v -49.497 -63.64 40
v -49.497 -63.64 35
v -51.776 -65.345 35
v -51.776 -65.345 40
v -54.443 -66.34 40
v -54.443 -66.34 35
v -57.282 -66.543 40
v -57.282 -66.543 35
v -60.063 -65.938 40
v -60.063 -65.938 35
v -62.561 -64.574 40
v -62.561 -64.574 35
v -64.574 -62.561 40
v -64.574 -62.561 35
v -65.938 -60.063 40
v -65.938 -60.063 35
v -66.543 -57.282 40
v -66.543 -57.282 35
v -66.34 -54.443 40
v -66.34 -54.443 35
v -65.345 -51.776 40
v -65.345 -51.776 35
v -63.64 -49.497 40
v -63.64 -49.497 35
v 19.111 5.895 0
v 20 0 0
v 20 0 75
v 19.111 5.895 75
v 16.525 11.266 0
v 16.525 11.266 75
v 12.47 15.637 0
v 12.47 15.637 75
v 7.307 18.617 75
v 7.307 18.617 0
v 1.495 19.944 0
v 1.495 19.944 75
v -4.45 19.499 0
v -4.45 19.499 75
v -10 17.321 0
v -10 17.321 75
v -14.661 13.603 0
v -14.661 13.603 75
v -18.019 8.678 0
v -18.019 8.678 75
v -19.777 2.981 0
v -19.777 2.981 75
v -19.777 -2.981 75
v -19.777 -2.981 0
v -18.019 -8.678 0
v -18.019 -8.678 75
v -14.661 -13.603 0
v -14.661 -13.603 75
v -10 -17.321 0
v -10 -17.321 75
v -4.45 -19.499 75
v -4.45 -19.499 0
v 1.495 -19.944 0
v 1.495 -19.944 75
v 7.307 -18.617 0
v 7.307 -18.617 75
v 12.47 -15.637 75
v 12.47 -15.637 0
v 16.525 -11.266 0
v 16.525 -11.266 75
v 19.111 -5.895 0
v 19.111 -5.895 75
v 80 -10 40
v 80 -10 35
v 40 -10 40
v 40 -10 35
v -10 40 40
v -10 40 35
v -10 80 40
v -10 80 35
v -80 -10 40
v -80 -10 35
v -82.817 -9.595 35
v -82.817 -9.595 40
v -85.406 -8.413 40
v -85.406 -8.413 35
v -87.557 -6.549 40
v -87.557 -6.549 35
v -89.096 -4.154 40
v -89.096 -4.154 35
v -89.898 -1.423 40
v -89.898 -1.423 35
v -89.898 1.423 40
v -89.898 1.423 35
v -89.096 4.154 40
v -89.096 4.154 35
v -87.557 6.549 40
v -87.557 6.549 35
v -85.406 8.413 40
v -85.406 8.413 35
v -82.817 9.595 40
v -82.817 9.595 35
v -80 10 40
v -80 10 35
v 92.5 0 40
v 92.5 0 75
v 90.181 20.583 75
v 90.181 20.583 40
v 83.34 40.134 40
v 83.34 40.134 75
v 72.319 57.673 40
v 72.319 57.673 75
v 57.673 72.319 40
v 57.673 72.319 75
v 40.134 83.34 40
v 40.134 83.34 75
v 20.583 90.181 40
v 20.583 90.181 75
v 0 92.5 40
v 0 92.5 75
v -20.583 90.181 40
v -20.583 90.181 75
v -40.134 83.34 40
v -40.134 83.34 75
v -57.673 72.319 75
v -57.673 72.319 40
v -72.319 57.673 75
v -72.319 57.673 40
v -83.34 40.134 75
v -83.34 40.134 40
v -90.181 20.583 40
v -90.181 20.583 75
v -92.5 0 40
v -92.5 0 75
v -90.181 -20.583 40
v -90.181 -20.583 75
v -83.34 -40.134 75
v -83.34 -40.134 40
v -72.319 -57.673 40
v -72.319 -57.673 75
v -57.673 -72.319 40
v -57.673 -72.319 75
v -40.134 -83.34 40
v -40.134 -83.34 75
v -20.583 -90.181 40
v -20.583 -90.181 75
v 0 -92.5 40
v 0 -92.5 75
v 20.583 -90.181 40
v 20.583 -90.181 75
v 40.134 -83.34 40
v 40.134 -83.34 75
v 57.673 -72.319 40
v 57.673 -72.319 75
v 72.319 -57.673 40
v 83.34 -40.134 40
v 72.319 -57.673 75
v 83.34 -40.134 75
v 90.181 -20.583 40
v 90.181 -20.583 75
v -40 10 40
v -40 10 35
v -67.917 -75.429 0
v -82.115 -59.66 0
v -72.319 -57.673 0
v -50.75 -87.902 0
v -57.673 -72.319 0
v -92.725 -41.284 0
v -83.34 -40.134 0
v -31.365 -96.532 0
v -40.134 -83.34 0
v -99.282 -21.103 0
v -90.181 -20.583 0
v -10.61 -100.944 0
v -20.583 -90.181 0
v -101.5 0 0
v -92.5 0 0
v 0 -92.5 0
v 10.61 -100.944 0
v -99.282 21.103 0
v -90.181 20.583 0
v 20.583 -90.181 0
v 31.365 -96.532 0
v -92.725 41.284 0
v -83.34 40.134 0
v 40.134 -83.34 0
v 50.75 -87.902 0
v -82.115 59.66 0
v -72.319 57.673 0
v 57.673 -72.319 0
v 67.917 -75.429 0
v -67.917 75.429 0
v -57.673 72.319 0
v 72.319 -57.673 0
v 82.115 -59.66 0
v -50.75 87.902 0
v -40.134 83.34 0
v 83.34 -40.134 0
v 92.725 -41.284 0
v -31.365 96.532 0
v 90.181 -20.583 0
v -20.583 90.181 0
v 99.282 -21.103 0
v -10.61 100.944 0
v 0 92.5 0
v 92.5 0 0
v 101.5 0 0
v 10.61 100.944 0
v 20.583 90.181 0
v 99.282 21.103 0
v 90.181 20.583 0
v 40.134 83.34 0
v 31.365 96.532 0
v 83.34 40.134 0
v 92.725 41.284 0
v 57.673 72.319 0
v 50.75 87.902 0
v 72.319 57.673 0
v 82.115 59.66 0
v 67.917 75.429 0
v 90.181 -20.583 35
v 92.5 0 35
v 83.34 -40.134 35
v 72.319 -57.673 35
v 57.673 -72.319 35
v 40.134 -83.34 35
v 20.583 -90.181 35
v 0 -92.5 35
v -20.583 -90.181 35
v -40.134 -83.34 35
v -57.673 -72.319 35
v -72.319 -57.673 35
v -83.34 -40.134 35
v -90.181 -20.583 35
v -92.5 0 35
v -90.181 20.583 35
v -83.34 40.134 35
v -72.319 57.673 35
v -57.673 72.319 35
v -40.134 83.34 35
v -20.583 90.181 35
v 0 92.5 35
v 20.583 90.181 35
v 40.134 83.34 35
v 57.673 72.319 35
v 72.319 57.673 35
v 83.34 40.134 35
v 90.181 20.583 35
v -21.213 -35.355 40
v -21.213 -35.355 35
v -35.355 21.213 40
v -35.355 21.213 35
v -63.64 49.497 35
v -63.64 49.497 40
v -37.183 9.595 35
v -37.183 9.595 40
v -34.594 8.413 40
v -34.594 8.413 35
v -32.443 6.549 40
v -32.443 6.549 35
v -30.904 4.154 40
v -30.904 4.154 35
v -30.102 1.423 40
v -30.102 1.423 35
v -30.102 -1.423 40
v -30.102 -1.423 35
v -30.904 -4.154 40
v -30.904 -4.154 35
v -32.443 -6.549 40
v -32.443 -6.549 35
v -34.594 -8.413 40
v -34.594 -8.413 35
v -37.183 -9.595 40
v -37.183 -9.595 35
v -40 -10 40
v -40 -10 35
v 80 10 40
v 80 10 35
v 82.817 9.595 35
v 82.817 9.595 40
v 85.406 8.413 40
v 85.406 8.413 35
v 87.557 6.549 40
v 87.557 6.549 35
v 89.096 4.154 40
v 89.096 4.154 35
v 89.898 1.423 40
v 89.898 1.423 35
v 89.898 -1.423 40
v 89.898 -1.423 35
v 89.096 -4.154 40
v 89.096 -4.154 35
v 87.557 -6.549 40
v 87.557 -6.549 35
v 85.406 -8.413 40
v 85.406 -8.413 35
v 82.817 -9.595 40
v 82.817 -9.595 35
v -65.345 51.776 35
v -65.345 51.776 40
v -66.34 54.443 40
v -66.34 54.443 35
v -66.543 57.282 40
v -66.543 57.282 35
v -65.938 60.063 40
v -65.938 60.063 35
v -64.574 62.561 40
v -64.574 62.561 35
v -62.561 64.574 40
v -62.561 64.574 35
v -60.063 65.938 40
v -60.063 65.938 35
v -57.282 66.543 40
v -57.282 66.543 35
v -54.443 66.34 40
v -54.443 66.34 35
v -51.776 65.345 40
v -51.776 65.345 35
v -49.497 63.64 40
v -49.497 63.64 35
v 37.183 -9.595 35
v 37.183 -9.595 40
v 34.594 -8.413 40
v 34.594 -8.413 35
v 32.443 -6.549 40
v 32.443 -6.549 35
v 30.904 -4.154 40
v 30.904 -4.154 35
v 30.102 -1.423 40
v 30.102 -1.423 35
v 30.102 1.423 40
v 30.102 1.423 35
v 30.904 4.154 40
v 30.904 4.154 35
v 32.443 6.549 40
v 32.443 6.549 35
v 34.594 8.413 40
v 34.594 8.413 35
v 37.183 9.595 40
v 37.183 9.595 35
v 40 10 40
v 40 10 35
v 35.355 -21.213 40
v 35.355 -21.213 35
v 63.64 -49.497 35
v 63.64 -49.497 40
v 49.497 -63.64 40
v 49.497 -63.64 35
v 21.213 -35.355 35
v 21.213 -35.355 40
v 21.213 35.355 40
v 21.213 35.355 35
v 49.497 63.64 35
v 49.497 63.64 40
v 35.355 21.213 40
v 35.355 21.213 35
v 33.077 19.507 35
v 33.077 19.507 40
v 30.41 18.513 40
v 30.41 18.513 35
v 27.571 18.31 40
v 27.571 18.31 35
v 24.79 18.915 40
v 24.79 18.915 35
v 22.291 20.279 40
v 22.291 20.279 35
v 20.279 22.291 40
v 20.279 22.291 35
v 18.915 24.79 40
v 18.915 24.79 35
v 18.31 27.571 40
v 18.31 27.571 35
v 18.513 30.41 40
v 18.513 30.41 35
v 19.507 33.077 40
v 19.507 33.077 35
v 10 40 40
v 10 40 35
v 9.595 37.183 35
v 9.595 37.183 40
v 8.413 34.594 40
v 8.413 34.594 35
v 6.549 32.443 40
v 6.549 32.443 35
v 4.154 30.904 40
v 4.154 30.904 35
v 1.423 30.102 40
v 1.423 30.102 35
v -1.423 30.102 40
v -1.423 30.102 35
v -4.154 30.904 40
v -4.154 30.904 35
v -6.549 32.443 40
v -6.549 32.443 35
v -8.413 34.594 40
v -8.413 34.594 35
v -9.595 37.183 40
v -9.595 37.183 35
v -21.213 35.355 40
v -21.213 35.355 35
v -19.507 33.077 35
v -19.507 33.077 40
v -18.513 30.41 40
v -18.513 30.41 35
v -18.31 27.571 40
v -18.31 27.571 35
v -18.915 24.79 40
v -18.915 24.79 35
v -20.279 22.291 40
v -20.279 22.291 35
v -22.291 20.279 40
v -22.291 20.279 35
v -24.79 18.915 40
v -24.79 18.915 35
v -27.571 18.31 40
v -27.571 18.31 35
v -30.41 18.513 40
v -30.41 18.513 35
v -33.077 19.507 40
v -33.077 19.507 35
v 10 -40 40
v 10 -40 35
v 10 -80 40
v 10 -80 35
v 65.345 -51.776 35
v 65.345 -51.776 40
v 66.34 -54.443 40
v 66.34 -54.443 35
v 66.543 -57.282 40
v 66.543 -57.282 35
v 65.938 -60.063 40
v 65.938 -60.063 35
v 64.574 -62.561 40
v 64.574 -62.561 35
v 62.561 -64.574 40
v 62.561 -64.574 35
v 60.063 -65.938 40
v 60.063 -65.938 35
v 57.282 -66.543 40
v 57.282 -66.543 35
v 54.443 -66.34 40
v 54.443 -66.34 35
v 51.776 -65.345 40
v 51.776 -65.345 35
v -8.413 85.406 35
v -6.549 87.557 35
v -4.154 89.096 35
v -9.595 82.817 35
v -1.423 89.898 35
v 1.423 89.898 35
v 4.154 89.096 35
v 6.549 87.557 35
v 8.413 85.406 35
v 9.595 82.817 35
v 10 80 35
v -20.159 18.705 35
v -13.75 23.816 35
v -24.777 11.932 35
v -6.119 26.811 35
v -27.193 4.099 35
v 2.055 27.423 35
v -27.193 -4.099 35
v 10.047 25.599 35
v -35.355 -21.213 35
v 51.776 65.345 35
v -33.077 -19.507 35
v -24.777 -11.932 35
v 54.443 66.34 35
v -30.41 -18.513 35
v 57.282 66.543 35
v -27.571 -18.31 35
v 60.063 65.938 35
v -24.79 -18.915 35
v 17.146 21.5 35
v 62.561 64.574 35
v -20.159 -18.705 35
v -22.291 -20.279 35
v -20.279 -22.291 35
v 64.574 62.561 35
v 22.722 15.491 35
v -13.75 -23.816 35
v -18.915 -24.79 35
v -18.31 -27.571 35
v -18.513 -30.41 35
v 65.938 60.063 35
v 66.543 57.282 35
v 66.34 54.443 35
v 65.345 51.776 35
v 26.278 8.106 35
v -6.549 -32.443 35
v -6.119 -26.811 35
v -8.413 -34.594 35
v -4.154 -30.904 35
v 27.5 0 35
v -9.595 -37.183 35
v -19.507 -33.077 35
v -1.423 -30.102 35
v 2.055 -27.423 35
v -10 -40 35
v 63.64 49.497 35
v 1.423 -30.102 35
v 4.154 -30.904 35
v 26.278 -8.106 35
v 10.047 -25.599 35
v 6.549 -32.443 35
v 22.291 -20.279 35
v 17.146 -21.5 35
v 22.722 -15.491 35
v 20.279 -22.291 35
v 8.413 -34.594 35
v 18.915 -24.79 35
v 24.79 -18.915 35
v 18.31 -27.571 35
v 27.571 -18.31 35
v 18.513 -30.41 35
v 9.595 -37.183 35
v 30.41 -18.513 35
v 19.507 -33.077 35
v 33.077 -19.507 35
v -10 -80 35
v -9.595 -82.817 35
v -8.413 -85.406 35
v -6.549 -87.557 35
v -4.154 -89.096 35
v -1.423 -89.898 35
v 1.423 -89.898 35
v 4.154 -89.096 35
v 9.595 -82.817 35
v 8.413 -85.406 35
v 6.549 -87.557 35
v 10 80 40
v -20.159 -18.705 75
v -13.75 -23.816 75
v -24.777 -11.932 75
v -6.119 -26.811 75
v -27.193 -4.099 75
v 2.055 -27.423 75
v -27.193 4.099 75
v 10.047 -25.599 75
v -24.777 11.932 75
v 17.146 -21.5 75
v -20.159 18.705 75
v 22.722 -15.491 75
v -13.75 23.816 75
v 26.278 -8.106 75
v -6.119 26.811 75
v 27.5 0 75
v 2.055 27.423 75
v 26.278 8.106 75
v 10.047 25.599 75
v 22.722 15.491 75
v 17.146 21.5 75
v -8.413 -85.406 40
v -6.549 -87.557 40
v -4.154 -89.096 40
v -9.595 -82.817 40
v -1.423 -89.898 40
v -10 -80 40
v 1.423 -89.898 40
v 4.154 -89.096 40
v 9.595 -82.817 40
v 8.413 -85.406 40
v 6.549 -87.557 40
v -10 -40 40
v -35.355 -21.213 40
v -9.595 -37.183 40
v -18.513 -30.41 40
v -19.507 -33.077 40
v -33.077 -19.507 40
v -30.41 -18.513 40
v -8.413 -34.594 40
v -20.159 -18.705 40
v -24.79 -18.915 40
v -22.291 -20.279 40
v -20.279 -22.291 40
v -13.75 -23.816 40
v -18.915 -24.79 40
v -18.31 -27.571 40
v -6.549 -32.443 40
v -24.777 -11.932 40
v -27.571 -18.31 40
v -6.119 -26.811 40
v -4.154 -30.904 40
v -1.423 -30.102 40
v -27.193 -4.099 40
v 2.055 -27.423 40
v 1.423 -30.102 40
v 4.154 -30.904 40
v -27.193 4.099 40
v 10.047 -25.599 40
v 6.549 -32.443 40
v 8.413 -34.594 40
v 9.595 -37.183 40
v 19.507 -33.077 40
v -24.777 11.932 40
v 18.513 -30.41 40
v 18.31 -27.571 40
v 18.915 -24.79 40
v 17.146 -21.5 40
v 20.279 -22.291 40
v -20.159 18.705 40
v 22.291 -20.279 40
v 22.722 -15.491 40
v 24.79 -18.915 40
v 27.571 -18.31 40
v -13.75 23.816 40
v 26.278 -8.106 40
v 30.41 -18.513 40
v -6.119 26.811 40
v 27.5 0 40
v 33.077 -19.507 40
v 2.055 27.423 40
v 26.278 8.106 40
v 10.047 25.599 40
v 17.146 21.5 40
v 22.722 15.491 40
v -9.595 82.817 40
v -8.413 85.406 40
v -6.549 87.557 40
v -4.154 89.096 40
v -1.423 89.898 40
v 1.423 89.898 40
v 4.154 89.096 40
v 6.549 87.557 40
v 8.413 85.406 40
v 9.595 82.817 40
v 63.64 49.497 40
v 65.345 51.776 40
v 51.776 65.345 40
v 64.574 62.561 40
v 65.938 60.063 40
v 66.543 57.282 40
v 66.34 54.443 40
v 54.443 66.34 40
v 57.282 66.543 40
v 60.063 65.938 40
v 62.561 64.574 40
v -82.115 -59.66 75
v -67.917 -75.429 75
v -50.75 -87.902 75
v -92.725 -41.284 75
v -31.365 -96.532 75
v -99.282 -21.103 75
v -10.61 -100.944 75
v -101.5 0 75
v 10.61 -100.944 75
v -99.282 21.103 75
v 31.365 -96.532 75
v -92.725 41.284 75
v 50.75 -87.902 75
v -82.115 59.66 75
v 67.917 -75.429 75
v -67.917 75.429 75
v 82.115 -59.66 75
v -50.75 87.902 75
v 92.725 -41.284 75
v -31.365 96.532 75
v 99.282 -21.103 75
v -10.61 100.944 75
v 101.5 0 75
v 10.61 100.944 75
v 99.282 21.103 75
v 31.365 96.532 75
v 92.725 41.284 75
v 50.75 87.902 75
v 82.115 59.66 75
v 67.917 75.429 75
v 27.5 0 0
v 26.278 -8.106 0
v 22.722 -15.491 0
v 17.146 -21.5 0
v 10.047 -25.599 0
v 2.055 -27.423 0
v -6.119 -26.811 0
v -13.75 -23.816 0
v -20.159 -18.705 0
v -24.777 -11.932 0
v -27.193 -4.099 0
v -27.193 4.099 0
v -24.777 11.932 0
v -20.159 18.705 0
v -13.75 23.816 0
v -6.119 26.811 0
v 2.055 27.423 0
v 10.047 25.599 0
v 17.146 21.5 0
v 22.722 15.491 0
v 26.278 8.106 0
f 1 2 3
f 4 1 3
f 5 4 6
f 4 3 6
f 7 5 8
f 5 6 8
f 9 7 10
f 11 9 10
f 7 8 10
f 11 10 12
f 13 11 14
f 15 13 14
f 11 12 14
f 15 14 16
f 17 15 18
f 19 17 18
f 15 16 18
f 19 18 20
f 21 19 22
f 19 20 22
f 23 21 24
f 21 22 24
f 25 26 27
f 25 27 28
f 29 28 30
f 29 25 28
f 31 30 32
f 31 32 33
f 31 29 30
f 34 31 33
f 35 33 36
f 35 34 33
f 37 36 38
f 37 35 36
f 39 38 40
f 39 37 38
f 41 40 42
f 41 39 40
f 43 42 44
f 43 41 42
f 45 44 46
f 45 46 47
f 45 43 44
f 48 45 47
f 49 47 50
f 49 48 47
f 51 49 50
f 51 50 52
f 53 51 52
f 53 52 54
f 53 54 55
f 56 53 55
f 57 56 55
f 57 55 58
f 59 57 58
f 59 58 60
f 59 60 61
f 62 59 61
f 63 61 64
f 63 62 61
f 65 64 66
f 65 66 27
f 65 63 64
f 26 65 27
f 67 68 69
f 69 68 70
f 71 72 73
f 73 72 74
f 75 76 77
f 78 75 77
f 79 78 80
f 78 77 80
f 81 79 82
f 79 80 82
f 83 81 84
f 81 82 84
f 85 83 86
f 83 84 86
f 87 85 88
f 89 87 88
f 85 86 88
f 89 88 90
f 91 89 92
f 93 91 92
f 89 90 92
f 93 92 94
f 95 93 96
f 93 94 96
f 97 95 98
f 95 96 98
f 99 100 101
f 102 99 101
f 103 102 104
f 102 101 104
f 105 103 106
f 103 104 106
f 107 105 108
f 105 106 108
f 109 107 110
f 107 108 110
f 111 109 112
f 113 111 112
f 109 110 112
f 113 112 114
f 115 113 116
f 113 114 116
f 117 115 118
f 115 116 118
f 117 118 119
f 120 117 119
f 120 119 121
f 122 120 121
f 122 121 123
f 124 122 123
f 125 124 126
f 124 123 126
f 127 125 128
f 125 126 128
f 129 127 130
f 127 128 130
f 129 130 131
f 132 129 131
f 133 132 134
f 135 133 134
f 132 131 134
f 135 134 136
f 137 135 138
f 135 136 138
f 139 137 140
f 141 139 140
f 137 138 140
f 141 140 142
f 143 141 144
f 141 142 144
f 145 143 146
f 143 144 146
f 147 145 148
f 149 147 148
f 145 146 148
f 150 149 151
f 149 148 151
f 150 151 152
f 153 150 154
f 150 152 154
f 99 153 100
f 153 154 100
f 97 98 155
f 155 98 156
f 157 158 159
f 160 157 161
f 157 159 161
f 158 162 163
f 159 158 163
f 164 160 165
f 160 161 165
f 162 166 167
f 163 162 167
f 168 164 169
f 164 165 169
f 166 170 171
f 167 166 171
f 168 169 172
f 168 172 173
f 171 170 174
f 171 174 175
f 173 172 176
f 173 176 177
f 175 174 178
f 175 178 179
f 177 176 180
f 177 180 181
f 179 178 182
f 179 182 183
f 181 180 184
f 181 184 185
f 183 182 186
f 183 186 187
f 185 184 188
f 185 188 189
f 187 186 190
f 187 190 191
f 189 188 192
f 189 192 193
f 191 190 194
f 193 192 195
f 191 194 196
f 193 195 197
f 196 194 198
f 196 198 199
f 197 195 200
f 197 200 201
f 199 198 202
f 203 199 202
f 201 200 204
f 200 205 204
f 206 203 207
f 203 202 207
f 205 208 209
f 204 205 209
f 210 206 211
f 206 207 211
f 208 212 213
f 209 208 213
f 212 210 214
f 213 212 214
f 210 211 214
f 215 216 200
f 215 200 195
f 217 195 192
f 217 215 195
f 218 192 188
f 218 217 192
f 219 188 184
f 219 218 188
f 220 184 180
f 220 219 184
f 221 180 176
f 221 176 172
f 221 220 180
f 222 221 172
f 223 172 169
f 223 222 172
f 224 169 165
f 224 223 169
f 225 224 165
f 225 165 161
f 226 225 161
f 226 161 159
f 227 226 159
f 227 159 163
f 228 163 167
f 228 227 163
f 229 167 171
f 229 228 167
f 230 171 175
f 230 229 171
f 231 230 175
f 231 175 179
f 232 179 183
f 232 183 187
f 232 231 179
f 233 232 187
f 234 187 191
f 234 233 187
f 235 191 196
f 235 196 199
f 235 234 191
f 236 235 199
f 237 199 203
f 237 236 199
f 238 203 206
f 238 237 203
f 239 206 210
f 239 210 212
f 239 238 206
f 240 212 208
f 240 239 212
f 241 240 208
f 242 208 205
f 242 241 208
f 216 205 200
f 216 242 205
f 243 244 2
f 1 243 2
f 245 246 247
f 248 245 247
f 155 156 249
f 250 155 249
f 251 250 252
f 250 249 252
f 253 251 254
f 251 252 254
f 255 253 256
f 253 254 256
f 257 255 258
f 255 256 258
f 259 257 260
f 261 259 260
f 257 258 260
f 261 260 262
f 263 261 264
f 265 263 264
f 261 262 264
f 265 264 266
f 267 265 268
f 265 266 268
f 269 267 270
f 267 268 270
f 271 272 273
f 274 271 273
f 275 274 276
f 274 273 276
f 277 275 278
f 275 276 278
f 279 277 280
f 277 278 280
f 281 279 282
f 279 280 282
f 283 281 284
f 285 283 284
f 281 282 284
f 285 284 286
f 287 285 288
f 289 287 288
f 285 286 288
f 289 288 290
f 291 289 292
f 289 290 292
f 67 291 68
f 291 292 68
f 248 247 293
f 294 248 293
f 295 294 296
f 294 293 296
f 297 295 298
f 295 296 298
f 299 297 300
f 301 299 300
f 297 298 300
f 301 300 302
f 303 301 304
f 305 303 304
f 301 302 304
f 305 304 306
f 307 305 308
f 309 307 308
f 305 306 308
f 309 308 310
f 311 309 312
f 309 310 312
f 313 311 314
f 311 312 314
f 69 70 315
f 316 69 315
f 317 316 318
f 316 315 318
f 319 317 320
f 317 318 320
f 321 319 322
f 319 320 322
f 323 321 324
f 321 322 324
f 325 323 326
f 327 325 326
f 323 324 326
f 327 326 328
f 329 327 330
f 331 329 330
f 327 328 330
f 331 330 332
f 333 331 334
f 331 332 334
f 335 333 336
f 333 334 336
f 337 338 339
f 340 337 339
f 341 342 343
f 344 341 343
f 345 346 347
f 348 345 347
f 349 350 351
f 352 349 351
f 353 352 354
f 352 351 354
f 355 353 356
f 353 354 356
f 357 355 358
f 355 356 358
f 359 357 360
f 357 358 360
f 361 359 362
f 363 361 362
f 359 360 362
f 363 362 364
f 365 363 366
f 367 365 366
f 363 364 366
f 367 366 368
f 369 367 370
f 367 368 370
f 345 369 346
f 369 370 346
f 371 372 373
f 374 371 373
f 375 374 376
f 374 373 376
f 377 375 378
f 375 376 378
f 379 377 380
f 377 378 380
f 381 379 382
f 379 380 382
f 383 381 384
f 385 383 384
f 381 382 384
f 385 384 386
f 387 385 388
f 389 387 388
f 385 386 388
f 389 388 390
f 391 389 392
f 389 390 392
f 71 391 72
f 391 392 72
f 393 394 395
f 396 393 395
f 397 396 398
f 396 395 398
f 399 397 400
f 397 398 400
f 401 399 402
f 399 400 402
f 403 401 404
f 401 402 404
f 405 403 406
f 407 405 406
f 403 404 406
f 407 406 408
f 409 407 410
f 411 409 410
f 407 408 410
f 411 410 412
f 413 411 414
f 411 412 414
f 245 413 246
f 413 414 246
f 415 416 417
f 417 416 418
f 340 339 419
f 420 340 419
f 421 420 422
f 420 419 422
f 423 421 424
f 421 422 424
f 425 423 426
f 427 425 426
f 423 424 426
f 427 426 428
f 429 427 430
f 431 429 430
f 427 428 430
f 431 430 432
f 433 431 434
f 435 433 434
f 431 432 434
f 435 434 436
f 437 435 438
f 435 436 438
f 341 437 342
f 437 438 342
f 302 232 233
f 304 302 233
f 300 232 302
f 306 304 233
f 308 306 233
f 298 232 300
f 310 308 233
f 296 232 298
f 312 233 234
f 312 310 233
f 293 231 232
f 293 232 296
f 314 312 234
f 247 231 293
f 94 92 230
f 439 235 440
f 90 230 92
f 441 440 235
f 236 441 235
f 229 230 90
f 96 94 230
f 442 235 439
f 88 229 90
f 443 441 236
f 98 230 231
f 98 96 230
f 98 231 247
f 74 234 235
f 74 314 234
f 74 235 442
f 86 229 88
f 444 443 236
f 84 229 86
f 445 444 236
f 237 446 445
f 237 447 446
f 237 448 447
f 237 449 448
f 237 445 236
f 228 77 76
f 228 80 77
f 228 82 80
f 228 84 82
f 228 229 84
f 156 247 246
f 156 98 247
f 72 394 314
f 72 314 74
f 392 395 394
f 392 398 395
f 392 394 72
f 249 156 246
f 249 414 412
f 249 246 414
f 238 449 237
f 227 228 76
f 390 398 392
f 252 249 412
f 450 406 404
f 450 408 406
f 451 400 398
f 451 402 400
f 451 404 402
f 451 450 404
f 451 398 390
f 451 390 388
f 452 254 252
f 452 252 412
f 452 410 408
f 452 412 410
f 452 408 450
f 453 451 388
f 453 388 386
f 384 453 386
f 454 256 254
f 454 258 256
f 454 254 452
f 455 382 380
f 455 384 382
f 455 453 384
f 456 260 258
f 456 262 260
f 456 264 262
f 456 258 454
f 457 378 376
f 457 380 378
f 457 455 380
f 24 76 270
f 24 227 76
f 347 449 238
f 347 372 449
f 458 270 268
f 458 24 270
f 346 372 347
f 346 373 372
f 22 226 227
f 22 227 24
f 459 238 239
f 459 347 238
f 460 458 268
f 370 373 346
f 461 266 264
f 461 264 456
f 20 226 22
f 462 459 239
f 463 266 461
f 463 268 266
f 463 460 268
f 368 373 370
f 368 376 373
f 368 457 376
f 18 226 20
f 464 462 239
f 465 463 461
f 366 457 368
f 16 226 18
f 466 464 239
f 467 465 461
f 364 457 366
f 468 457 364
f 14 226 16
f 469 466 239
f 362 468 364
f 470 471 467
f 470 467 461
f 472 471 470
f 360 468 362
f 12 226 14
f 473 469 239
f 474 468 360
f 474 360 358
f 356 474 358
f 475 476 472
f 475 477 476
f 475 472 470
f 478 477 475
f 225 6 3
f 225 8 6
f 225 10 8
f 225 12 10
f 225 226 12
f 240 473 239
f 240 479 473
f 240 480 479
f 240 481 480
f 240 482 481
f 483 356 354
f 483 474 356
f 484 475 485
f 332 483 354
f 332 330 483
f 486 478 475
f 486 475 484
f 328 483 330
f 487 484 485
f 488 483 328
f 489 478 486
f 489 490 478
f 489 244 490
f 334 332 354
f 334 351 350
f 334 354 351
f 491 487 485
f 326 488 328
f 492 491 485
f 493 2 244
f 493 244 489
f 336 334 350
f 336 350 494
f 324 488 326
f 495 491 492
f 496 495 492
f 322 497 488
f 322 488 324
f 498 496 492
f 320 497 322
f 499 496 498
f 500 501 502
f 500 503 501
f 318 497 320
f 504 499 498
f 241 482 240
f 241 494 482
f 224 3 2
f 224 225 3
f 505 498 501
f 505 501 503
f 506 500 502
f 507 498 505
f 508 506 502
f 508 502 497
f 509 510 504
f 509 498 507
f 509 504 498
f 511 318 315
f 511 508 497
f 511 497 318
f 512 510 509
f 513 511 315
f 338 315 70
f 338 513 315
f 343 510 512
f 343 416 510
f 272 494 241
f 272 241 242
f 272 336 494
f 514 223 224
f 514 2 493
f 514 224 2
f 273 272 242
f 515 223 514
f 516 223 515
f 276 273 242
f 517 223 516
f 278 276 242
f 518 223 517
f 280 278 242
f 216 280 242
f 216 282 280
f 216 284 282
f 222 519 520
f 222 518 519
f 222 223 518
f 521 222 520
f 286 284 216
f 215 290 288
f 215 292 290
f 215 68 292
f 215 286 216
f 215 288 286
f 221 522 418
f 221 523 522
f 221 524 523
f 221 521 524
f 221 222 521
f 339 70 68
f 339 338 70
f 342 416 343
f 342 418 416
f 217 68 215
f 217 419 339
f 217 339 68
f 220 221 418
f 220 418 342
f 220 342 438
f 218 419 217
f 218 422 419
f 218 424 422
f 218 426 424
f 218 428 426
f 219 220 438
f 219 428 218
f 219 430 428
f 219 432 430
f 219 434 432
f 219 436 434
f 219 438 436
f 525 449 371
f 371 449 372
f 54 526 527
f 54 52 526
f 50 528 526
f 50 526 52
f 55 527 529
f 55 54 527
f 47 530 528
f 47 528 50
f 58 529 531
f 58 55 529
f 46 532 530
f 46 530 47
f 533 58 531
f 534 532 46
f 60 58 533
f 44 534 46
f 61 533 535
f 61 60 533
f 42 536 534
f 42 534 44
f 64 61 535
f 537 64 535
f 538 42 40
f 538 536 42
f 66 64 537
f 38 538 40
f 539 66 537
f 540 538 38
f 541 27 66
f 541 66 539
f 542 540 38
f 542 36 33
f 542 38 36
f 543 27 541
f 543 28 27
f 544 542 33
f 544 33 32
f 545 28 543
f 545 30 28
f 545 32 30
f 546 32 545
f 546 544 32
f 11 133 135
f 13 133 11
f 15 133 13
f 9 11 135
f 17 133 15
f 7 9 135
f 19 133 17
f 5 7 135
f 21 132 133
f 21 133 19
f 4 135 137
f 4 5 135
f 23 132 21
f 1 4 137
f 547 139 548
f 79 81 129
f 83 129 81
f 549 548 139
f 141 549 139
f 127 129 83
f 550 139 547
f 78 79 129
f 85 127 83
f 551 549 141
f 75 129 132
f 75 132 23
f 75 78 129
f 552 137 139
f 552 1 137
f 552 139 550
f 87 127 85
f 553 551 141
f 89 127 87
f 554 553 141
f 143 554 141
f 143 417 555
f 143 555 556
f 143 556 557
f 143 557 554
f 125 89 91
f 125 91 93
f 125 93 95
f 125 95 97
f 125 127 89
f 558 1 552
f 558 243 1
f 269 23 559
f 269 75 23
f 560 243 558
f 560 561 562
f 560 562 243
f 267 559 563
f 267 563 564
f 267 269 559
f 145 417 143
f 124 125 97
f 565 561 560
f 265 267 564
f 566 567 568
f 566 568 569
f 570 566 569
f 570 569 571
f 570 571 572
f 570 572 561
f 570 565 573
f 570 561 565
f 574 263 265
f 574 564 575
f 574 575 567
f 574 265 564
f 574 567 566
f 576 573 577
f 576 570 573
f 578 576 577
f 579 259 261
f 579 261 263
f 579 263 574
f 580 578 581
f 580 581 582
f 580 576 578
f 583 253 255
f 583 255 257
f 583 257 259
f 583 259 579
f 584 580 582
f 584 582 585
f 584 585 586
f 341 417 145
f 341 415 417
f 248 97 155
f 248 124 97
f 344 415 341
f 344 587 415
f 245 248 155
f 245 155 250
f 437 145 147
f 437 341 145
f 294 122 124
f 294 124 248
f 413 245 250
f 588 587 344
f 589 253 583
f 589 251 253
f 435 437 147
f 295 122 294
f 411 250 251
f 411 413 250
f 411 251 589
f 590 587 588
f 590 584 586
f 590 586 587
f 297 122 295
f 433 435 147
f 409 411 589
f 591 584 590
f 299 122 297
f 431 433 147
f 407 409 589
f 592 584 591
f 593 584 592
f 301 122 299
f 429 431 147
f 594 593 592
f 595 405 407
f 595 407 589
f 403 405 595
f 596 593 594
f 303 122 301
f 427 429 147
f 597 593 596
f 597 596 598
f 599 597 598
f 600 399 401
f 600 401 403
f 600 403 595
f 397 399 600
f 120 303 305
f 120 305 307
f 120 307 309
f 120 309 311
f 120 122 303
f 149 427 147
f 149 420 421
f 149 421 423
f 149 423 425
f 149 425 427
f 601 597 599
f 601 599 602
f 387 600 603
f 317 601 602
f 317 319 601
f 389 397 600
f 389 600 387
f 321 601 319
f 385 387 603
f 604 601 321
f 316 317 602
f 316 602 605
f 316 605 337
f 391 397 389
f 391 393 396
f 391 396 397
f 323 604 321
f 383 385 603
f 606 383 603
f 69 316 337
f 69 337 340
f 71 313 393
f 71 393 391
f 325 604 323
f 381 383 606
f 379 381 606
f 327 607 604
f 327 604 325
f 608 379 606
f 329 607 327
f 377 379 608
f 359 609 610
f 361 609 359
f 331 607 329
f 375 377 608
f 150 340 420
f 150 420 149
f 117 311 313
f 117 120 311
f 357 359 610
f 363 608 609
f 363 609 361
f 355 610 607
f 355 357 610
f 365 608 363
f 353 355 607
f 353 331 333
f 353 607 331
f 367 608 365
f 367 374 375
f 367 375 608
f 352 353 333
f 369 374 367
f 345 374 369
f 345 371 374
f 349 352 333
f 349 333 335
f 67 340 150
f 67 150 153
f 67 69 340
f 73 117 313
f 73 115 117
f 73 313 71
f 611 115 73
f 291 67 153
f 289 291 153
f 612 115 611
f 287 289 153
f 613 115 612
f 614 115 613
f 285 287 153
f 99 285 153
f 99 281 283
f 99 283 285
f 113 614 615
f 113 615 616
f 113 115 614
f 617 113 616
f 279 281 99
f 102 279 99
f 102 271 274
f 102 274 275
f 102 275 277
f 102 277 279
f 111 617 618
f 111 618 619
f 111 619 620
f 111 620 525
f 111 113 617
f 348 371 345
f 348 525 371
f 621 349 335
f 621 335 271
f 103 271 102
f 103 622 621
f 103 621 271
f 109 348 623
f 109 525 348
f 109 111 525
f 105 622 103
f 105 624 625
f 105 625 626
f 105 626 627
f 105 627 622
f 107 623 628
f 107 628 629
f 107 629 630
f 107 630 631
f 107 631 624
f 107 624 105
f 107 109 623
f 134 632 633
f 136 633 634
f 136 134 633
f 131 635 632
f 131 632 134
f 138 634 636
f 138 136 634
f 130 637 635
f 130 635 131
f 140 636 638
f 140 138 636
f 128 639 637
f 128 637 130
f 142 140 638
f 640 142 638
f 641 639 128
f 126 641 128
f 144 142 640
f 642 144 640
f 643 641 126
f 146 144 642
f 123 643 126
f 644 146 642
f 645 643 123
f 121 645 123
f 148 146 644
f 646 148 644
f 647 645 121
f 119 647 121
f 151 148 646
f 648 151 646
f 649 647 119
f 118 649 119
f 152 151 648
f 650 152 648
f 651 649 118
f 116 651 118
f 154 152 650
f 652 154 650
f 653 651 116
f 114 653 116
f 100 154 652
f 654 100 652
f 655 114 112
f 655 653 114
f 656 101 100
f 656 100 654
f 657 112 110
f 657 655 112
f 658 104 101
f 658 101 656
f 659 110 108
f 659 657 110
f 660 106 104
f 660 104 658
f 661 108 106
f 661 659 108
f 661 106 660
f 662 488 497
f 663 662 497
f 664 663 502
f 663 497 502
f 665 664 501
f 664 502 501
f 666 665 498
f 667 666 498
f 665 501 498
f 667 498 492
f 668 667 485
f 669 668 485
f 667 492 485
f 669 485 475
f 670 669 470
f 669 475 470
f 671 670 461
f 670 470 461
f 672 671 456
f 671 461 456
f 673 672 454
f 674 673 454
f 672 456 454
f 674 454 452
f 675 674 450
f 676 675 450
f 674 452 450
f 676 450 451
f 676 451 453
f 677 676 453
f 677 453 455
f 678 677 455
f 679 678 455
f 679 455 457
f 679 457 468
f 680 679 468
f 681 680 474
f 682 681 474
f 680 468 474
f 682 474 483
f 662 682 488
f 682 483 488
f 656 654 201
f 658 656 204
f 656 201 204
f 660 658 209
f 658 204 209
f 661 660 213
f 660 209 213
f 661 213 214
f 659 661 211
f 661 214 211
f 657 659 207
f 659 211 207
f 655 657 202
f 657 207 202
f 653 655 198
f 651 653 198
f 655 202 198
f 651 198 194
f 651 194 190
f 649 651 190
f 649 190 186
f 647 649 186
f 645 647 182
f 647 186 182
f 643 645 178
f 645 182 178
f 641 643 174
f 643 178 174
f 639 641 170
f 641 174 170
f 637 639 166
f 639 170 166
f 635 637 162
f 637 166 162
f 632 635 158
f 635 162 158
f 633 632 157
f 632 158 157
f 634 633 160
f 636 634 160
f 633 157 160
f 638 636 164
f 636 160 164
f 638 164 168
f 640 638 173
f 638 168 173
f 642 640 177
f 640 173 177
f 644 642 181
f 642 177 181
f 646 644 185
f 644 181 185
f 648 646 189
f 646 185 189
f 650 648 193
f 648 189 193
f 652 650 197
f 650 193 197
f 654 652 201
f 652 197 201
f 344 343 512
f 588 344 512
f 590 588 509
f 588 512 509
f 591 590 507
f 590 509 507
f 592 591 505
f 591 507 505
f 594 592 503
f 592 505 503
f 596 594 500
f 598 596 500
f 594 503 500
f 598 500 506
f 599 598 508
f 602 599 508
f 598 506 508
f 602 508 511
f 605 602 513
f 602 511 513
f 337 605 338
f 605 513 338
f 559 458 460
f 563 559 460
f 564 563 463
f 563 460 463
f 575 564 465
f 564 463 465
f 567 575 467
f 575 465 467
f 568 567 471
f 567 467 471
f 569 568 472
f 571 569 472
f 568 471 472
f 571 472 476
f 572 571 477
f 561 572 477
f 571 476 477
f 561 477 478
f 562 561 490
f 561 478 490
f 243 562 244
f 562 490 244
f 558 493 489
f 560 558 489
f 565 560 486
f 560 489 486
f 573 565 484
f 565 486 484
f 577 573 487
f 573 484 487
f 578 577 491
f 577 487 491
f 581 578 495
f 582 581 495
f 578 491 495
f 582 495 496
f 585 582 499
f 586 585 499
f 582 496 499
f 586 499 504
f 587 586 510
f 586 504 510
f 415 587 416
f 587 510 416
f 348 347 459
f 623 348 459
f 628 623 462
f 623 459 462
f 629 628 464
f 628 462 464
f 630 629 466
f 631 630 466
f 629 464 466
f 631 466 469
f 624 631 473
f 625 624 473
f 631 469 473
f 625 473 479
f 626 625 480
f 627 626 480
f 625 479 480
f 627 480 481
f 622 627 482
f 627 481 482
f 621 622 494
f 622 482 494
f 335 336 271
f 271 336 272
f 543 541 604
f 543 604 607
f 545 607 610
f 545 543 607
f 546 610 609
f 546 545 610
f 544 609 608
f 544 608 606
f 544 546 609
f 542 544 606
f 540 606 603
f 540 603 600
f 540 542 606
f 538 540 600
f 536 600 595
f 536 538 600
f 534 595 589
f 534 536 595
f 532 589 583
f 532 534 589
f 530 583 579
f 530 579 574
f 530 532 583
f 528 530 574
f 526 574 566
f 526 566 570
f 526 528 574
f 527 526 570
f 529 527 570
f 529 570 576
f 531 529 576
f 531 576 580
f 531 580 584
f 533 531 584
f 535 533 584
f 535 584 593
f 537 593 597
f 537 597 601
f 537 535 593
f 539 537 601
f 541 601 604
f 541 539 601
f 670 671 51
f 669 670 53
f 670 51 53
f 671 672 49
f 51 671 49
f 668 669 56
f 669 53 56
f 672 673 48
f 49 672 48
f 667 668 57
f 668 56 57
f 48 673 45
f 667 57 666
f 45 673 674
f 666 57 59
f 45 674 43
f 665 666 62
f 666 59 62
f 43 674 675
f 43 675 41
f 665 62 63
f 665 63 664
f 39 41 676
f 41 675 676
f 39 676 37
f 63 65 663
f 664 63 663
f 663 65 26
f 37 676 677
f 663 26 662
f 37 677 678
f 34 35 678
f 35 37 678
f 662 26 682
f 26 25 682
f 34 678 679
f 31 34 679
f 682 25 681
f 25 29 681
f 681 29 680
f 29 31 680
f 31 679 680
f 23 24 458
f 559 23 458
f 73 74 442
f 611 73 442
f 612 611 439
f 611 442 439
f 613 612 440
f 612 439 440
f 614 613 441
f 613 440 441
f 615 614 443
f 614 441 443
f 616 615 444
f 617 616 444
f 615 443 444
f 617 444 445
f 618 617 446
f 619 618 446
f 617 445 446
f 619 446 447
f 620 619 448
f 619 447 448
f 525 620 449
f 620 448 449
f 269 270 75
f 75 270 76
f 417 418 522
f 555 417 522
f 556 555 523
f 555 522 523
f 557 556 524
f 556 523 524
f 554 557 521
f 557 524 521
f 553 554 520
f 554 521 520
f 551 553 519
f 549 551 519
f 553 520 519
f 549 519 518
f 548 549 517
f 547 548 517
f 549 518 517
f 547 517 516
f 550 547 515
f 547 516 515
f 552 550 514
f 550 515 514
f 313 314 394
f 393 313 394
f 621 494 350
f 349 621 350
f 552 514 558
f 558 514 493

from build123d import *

# Parameters (mm, degrees)
SKETCH1_R           = 101.5
SKETCH1_R_2         = 20
BOSS_EXTRUDE1_DEPTH = 75
SKETCH2_R           = 92.5
SKETCH2_R_2         = 27.5
CUT_EXTRUDE1_DEPTH  = 35
CUT_EXTRUDE2_START  = -35
SKETCH3_R           = 92.5
SKETCH3_R_2         = 27.5
CUT_EXTRUDE2_DEPTH  = 35


with BuildPart() as part:
    # Sketch1 → Boss-Extrude1 (new body)
    with BuildSketch(Plane.XY):
        Circle(SKETCH1_R)
        Circle(SKETCH1_R_2, mode=Mode.SUBTRACT)
        with BuildLine():
            Line((10, 80), (10, 40))
            ThreePointArc((10, 40), (0, 30), (-10, 40))
            Line((-10, 40), (-10, 80))
            ThreePointArc((-10, 80), (0, 90), (10, 80))
        make_face(mode=Mode.SUBTRACT)
        with BuildLine():
            Line((63.639610307, 49.497474683), (35.355339059, 21.213203436))
            ThreePointArc((35.355339059, 21.213203436), (21.213203436, 21.213203436), (21.213203436, 35.355339059))
            Line((21.213203436, 35.355339059), (49.497474683, 63.639610307))
            ThreePointArc((49.497474683, 63.639610307), (63.639610307, 63.639610307), (63.639610307, 49.497474683))
        make_face(mode=Mode.SUBTRACT)
        with BuildLine():
            Line((80, -10), (40, -10))
            ThreePointArc((40, -10), (30, 0), (40, 10))
            Line((40, 10), (80, 10))
            ThreePointArc((80, 10), (90, 0), (80, -10))
        make_face(mode=Mode.SUBTRACT)
        with BuildLine():
            Line((49.497474683, -63.639610307), (21.213203436, -35.355339059))
            ThreePointArc((21.213203436, -35.355339059), (21.213203436, -21.213203436), (35.355339059, -21.213203436))
            Line((35.355339059, -21.213203436), (63.639610307, -49.497474683))
            ThreePointArc((63.639610307, -49.497474683), (63.639610307, -63.639610307), (49.497474683, -63.639610307))
        make_face(mode=Mode.SUBTRACT)
        with BuildLine():
            Line((-10, -80), (-10, -40))
            ThreePointArc((-10, -40), (0, -30), (10, -40))
            Line((10, -40), (10, -80))
            ThreePointArc((10, -80), (0, -90), (-10, -80))
        make_face(mode=Mode.SUBTRACT)
        with BuildLine():
            Line((-63.639610307, -49.497474683), (-35.355339059, -21.213203436))
            ThreePointArc((-35.355339059, -21.213203436), (-21.213203436, -21.213203436), (-21.213203436, -35.355339059))
            Line((-21.213203436, -35.355339059), (-49.497474683, -63.639610307))
            ThreePointArc((-49.497474683, -63.639610307), (-63.639610307, -63.639610307), (-63.639610307, -49.497474683))
        make_face(mode=Mode.SUBTRACT)
        with BuildLine():
            Line((-80, 10), (-40, 10))
            ThreePointArc((-40, 10), (-30, 0), (-40, -10))
            Line((-40, -10), (-80, -10))
            ThreePointArc((-80, -10), (-90, 0), (-80, 10))
        make_face(mode=Mode.SUBTRACT)
        with BuildLine():
            Line((-49.497474683, 63.639610307), (-21.213203436, 35.355339059))
            ThreePointArc((-21.213203436, 35.355339059), (-21.213203436, 21.213203436), (-35.355339059, 21.213203436))
            Line((-35.355339059, 21.213203436), (-63.639610307, 49.497474683))
            ThreePointArc((-63.639610307, 49.497474683), (-63.639610307, 63.639610307), (-49.497474683, 63.639610307))
        make_face(mode=Mode.SUBTRACT)
    extrude(amount=BOSS_EXTRUDE1_DEPTH)

    # Sketch2 → Cut-Extrude1 (cut)
    with BuildSketch(Plane.XY.offset(75)):
        Circle(SKETCH2_R)
        Circle(SKETCH2_R_2, mode=Mode.SUBTRACT)
    extrude(amount=-CUT_EXTRUDE1_DEPTH, mode=Mode.SUBTRACT)

    # Sketch3 → Cut-Extrude2 (cut)
    with BuildSketch(Plane(origin=(0, 0, 0), x_dir=(-1, 0, 0), z_dir=(0, 0, -1)).offset(CUT_EXTRUDE2_START)):
        with Locations(Location((0, 0, 0), (0, 0, 180))):
            Circle(SKETCH3_R)
        with Locations(Location((0, 0, 0), (0, 0, 180))):
            Circle(SKETCH3_R_2, mode=Mode.SUBTRACT)
    extrude(amount=CUT_EXTRUDE2_DEPTH, mode=Mode.SUBTRACT)


solid = part.part
